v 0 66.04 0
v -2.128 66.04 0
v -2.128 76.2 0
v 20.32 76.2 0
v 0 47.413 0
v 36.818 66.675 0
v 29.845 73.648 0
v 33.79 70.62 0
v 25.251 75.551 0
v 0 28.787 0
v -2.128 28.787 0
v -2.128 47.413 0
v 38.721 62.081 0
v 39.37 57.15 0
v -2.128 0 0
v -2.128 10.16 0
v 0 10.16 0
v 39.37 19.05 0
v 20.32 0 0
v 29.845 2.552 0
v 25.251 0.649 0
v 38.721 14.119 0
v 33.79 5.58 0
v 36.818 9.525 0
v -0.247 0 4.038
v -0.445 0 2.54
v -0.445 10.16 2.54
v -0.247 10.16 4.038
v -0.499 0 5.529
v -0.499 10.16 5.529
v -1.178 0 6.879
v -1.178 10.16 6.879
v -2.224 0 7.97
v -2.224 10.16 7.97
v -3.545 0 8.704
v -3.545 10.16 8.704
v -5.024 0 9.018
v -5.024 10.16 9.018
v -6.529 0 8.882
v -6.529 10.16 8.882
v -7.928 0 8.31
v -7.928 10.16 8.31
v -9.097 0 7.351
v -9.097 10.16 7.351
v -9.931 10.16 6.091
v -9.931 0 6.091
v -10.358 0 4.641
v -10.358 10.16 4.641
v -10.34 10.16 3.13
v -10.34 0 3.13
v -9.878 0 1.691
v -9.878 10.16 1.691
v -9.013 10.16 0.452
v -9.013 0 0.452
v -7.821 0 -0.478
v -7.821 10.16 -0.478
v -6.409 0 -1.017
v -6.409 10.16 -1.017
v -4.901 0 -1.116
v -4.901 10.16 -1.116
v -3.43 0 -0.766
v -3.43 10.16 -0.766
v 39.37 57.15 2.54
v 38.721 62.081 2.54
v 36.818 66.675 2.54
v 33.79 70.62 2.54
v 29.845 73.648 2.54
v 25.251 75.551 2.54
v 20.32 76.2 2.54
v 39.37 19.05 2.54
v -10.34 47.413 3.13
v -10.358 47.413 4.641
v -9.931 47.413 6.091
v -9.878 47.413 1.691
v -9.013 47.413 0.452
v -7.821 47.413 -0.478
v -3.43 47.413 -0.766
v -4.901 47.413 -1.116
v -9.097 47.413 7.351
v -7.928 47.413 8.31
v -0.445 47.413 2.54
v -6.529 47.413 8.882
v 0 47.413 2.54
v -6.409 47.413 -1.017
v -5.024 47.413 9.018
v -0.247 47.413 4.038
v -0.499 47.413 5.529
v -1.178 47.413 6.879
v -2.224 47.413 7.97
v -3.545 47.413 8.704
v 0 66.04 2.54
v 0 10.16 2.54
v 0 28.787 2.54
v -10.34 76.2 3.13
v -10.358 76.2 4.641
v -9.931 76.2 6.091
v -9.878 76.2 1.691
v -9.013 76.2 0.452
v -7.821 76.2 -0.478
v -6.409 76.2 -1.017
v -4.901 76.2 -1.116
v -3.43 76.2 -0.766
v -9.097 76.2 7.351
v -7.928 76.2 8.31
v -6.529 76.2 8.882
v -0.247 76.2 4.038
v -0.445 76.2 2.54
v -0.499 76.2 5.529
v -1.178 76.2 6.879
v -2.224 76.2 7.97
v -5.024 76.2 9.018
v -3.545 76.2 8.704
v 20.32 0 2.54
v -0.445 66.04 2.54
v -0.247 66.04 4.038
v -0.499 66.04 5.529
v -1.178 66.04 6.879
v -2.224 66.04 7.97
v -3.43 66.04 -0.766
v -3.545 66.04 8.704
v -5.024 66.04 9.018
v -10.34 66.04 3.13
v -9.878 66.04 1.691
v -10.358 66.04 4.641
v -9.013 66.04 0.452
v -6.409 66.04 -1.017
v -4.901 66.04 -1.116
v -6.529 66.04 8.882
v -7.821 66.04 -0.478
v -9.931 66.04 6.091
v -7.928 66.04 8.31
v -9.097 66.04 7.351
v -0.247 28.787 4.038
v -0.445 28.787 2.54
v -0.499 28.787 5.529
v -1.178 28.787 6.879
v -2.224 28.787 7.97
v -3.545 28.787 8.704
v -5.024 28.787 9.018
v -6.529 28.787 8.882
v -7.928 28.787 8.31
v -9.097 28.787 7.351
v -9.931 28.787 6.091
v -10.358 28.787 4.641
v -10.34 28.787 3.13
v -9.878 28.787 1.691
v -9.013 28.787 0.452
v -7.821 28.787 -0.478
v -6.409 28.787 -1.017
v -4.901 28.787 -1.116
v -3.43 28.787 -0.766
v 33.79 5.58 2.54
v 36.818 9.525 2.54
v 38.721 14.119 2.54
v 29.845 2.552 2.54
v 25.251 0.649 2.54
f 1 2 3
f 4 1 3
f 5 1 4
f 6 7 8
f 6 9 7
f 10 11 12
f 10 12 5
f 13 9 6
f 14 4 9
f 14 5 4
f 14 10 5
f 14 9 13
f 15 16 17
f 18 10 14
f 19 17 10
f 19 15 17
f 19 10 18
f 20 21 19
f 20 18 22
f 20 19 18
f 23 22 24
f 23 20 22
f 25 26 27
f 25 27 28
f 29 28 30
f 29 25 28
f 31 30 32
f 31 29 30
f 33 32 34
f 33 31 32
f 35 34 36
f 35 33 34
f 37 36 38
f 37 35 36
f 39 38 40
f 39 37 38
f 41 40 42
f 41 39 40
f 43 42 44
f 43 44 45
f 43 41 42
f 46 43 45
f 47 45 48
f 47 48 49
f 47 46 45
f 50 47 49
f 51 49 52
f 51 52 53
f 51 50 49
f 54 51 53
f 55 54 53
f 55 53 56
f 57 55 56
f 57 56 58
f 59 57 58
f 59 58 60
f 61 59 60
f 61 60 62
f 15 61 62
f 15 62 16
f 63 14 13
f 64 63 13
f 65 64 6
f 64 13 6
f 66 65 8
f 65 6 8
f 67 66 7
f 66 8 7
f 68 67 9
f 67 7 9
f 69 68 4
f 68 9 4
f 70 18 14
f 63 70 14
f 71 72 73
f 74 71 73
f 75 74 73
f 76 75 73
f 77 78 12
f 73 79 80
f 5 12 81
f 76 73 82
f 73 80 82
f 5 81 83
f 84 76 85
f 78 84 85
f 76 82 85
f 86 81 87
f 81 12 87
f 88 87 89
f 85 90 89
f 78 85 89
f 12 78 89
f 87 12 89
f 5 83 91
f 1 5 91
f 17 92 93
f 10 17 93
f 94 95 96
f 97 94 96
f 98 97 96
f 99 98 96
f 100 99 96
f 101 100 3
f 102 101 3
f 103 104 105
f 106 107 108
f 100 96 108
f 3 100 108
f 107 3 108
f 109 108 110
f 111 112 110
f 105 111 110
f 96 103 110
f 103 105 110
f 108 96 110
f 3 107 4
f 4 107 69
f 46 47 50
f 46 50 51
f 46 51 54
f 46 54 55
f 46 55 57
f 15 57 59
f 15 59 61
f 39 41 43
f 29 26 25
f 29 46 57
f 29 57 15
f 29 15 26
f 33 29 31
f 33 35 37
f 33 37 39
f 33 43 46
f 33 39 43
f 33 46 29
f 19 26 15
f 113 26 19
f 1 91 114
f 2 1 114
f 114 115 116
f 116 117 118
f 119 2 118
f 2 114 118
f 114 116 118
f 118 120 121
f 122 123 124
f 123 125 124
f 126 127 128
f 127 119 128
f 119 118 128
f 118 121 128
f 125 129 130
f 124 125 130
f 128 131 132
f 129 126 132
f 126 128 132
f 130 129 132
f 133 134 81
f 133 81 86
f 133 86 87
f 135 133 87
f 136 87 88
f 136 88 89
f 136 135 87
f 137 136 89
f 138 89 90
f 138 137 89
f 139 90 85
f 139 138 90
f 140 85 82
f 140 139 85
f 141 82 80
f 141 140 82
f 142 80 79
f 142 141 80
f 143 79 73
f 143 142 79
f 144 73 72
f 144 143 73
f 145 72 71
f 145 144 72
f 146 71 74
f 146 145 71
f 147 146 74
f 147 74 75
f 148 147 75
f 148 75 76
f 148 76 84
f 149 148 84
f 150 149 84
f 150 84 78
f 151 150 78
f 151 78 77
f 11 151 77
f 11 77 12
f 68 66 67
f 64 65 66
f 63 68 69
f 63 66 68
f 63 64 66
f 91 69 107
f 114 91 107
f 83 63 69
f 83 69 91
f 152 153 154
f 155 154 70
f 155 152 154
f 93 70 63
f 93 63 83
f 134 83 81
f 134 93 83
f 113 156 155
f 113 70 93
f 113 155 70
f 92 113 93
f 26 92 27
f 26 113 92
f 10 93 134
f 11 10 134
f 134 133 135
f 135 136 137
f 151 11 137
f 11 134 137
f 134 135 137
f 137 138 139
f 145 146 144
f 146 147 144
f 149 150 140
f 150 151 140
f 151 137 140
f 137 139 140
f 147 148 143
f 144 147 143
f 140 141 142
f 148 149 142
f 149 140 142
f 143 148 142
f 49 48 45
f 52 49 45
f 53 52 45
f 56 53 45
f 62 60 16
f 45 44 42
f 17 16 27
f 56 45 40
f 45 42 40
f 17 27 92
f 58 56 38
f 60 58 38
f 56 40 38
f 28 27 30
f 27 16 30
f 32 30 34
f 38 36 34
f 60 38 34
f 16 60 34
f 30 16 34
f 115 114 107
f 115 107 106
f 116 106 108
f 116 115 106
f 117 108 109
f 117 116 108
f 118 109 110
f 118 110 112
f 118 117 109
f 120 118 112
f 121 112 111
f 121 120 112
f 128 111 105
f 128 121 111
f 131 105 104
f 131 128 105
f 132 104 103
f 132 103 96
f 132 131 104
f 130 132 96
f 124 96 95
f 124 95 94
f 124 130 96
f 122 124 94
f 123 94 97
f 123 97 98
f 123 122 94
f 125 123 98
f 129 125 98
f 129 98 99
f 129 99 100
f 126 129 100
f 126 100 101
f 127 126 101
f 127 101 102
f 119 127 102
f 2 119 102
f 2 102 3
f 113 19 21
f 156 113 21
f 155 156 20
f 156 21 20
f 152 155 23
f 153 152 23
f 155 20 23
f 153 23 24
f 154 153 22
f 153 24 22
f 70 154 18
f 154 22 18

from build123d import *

# Parameters (mm, degrees)
F1_DEPTH      = 2.54
F3_DEPTH      = 76.2
F4_W          = 16.2733292935
F4_H          = 18.6266666667
F4_W_2        = 0.444823617
F5_DEPTH      = 3.6743734411
F5_DEPTH_BACK = 6.4876265589


with BuildPart() as f1:
    # F0 (on Top) → F1 (new body)
    with BuildSketch(Plane.XY):
        with BuildLine():
            Line((0, 76.2), (0, 0))
            Line((0, 0), (20.32, 0))
            ThreePointArc((20.32, 0), (33.7903841816, 5.5796158184), (39.37, 19.05))
            Line((39.37, 19.05), (39.37, 57.15))
            ThreePointArc((39.37, 57.15), (33.7903841816, 70.6203841816), (20.32, 76.2))
            Line((20.32, 76.2), (0, 76.2))
        make_face()
    extrude(amount=F1_DEPTH)

    # F2 (on face) → F3 (join, through all)
    with BuildSketch(Plane.XZ):
        with BuildLine():
            Line((0, 2.54), (-0.444823617, 2.54))
            ThreePointArc((-0.444823617, 2.54), (-9.5610605276, 6.7523933173), (-2.1276752047, 0))
            Line((-2.1276752047, 0), (0, 0))
            Line((0, 0), (0, 2.54))
        make_face()
    extrude(amount=-F3_DEPTH)

    # F4 (on face) → F5 (cut, two sides)
    with BuildSketch(Plane.XY.offset(2.54)) as f5_sk:
        with Locations((-8.5814882637, 56.7266666667)):
            Rectangle(F4_W, F4_H)
        with Locations((-0.2224118085, 56.7266666667)):
            Rectangle(F4_W_2, F4_H)
        with Locations((-8.5814882637, 19.4733333333)):
            Rectangle(F4_W, F4_H)
        with Locations((-0.2224118085, 19.4733333333)):
            Rectangle(F4_W_2, F4_H)
    extrude(amount=-F5_DEPTH, mode=Mode.SUBTRACT)
    extrude(f5_sk.sketch, amount=F5_DEPTH_BACK, mode=Mode.SUBTRACT)


solid = f1.part
